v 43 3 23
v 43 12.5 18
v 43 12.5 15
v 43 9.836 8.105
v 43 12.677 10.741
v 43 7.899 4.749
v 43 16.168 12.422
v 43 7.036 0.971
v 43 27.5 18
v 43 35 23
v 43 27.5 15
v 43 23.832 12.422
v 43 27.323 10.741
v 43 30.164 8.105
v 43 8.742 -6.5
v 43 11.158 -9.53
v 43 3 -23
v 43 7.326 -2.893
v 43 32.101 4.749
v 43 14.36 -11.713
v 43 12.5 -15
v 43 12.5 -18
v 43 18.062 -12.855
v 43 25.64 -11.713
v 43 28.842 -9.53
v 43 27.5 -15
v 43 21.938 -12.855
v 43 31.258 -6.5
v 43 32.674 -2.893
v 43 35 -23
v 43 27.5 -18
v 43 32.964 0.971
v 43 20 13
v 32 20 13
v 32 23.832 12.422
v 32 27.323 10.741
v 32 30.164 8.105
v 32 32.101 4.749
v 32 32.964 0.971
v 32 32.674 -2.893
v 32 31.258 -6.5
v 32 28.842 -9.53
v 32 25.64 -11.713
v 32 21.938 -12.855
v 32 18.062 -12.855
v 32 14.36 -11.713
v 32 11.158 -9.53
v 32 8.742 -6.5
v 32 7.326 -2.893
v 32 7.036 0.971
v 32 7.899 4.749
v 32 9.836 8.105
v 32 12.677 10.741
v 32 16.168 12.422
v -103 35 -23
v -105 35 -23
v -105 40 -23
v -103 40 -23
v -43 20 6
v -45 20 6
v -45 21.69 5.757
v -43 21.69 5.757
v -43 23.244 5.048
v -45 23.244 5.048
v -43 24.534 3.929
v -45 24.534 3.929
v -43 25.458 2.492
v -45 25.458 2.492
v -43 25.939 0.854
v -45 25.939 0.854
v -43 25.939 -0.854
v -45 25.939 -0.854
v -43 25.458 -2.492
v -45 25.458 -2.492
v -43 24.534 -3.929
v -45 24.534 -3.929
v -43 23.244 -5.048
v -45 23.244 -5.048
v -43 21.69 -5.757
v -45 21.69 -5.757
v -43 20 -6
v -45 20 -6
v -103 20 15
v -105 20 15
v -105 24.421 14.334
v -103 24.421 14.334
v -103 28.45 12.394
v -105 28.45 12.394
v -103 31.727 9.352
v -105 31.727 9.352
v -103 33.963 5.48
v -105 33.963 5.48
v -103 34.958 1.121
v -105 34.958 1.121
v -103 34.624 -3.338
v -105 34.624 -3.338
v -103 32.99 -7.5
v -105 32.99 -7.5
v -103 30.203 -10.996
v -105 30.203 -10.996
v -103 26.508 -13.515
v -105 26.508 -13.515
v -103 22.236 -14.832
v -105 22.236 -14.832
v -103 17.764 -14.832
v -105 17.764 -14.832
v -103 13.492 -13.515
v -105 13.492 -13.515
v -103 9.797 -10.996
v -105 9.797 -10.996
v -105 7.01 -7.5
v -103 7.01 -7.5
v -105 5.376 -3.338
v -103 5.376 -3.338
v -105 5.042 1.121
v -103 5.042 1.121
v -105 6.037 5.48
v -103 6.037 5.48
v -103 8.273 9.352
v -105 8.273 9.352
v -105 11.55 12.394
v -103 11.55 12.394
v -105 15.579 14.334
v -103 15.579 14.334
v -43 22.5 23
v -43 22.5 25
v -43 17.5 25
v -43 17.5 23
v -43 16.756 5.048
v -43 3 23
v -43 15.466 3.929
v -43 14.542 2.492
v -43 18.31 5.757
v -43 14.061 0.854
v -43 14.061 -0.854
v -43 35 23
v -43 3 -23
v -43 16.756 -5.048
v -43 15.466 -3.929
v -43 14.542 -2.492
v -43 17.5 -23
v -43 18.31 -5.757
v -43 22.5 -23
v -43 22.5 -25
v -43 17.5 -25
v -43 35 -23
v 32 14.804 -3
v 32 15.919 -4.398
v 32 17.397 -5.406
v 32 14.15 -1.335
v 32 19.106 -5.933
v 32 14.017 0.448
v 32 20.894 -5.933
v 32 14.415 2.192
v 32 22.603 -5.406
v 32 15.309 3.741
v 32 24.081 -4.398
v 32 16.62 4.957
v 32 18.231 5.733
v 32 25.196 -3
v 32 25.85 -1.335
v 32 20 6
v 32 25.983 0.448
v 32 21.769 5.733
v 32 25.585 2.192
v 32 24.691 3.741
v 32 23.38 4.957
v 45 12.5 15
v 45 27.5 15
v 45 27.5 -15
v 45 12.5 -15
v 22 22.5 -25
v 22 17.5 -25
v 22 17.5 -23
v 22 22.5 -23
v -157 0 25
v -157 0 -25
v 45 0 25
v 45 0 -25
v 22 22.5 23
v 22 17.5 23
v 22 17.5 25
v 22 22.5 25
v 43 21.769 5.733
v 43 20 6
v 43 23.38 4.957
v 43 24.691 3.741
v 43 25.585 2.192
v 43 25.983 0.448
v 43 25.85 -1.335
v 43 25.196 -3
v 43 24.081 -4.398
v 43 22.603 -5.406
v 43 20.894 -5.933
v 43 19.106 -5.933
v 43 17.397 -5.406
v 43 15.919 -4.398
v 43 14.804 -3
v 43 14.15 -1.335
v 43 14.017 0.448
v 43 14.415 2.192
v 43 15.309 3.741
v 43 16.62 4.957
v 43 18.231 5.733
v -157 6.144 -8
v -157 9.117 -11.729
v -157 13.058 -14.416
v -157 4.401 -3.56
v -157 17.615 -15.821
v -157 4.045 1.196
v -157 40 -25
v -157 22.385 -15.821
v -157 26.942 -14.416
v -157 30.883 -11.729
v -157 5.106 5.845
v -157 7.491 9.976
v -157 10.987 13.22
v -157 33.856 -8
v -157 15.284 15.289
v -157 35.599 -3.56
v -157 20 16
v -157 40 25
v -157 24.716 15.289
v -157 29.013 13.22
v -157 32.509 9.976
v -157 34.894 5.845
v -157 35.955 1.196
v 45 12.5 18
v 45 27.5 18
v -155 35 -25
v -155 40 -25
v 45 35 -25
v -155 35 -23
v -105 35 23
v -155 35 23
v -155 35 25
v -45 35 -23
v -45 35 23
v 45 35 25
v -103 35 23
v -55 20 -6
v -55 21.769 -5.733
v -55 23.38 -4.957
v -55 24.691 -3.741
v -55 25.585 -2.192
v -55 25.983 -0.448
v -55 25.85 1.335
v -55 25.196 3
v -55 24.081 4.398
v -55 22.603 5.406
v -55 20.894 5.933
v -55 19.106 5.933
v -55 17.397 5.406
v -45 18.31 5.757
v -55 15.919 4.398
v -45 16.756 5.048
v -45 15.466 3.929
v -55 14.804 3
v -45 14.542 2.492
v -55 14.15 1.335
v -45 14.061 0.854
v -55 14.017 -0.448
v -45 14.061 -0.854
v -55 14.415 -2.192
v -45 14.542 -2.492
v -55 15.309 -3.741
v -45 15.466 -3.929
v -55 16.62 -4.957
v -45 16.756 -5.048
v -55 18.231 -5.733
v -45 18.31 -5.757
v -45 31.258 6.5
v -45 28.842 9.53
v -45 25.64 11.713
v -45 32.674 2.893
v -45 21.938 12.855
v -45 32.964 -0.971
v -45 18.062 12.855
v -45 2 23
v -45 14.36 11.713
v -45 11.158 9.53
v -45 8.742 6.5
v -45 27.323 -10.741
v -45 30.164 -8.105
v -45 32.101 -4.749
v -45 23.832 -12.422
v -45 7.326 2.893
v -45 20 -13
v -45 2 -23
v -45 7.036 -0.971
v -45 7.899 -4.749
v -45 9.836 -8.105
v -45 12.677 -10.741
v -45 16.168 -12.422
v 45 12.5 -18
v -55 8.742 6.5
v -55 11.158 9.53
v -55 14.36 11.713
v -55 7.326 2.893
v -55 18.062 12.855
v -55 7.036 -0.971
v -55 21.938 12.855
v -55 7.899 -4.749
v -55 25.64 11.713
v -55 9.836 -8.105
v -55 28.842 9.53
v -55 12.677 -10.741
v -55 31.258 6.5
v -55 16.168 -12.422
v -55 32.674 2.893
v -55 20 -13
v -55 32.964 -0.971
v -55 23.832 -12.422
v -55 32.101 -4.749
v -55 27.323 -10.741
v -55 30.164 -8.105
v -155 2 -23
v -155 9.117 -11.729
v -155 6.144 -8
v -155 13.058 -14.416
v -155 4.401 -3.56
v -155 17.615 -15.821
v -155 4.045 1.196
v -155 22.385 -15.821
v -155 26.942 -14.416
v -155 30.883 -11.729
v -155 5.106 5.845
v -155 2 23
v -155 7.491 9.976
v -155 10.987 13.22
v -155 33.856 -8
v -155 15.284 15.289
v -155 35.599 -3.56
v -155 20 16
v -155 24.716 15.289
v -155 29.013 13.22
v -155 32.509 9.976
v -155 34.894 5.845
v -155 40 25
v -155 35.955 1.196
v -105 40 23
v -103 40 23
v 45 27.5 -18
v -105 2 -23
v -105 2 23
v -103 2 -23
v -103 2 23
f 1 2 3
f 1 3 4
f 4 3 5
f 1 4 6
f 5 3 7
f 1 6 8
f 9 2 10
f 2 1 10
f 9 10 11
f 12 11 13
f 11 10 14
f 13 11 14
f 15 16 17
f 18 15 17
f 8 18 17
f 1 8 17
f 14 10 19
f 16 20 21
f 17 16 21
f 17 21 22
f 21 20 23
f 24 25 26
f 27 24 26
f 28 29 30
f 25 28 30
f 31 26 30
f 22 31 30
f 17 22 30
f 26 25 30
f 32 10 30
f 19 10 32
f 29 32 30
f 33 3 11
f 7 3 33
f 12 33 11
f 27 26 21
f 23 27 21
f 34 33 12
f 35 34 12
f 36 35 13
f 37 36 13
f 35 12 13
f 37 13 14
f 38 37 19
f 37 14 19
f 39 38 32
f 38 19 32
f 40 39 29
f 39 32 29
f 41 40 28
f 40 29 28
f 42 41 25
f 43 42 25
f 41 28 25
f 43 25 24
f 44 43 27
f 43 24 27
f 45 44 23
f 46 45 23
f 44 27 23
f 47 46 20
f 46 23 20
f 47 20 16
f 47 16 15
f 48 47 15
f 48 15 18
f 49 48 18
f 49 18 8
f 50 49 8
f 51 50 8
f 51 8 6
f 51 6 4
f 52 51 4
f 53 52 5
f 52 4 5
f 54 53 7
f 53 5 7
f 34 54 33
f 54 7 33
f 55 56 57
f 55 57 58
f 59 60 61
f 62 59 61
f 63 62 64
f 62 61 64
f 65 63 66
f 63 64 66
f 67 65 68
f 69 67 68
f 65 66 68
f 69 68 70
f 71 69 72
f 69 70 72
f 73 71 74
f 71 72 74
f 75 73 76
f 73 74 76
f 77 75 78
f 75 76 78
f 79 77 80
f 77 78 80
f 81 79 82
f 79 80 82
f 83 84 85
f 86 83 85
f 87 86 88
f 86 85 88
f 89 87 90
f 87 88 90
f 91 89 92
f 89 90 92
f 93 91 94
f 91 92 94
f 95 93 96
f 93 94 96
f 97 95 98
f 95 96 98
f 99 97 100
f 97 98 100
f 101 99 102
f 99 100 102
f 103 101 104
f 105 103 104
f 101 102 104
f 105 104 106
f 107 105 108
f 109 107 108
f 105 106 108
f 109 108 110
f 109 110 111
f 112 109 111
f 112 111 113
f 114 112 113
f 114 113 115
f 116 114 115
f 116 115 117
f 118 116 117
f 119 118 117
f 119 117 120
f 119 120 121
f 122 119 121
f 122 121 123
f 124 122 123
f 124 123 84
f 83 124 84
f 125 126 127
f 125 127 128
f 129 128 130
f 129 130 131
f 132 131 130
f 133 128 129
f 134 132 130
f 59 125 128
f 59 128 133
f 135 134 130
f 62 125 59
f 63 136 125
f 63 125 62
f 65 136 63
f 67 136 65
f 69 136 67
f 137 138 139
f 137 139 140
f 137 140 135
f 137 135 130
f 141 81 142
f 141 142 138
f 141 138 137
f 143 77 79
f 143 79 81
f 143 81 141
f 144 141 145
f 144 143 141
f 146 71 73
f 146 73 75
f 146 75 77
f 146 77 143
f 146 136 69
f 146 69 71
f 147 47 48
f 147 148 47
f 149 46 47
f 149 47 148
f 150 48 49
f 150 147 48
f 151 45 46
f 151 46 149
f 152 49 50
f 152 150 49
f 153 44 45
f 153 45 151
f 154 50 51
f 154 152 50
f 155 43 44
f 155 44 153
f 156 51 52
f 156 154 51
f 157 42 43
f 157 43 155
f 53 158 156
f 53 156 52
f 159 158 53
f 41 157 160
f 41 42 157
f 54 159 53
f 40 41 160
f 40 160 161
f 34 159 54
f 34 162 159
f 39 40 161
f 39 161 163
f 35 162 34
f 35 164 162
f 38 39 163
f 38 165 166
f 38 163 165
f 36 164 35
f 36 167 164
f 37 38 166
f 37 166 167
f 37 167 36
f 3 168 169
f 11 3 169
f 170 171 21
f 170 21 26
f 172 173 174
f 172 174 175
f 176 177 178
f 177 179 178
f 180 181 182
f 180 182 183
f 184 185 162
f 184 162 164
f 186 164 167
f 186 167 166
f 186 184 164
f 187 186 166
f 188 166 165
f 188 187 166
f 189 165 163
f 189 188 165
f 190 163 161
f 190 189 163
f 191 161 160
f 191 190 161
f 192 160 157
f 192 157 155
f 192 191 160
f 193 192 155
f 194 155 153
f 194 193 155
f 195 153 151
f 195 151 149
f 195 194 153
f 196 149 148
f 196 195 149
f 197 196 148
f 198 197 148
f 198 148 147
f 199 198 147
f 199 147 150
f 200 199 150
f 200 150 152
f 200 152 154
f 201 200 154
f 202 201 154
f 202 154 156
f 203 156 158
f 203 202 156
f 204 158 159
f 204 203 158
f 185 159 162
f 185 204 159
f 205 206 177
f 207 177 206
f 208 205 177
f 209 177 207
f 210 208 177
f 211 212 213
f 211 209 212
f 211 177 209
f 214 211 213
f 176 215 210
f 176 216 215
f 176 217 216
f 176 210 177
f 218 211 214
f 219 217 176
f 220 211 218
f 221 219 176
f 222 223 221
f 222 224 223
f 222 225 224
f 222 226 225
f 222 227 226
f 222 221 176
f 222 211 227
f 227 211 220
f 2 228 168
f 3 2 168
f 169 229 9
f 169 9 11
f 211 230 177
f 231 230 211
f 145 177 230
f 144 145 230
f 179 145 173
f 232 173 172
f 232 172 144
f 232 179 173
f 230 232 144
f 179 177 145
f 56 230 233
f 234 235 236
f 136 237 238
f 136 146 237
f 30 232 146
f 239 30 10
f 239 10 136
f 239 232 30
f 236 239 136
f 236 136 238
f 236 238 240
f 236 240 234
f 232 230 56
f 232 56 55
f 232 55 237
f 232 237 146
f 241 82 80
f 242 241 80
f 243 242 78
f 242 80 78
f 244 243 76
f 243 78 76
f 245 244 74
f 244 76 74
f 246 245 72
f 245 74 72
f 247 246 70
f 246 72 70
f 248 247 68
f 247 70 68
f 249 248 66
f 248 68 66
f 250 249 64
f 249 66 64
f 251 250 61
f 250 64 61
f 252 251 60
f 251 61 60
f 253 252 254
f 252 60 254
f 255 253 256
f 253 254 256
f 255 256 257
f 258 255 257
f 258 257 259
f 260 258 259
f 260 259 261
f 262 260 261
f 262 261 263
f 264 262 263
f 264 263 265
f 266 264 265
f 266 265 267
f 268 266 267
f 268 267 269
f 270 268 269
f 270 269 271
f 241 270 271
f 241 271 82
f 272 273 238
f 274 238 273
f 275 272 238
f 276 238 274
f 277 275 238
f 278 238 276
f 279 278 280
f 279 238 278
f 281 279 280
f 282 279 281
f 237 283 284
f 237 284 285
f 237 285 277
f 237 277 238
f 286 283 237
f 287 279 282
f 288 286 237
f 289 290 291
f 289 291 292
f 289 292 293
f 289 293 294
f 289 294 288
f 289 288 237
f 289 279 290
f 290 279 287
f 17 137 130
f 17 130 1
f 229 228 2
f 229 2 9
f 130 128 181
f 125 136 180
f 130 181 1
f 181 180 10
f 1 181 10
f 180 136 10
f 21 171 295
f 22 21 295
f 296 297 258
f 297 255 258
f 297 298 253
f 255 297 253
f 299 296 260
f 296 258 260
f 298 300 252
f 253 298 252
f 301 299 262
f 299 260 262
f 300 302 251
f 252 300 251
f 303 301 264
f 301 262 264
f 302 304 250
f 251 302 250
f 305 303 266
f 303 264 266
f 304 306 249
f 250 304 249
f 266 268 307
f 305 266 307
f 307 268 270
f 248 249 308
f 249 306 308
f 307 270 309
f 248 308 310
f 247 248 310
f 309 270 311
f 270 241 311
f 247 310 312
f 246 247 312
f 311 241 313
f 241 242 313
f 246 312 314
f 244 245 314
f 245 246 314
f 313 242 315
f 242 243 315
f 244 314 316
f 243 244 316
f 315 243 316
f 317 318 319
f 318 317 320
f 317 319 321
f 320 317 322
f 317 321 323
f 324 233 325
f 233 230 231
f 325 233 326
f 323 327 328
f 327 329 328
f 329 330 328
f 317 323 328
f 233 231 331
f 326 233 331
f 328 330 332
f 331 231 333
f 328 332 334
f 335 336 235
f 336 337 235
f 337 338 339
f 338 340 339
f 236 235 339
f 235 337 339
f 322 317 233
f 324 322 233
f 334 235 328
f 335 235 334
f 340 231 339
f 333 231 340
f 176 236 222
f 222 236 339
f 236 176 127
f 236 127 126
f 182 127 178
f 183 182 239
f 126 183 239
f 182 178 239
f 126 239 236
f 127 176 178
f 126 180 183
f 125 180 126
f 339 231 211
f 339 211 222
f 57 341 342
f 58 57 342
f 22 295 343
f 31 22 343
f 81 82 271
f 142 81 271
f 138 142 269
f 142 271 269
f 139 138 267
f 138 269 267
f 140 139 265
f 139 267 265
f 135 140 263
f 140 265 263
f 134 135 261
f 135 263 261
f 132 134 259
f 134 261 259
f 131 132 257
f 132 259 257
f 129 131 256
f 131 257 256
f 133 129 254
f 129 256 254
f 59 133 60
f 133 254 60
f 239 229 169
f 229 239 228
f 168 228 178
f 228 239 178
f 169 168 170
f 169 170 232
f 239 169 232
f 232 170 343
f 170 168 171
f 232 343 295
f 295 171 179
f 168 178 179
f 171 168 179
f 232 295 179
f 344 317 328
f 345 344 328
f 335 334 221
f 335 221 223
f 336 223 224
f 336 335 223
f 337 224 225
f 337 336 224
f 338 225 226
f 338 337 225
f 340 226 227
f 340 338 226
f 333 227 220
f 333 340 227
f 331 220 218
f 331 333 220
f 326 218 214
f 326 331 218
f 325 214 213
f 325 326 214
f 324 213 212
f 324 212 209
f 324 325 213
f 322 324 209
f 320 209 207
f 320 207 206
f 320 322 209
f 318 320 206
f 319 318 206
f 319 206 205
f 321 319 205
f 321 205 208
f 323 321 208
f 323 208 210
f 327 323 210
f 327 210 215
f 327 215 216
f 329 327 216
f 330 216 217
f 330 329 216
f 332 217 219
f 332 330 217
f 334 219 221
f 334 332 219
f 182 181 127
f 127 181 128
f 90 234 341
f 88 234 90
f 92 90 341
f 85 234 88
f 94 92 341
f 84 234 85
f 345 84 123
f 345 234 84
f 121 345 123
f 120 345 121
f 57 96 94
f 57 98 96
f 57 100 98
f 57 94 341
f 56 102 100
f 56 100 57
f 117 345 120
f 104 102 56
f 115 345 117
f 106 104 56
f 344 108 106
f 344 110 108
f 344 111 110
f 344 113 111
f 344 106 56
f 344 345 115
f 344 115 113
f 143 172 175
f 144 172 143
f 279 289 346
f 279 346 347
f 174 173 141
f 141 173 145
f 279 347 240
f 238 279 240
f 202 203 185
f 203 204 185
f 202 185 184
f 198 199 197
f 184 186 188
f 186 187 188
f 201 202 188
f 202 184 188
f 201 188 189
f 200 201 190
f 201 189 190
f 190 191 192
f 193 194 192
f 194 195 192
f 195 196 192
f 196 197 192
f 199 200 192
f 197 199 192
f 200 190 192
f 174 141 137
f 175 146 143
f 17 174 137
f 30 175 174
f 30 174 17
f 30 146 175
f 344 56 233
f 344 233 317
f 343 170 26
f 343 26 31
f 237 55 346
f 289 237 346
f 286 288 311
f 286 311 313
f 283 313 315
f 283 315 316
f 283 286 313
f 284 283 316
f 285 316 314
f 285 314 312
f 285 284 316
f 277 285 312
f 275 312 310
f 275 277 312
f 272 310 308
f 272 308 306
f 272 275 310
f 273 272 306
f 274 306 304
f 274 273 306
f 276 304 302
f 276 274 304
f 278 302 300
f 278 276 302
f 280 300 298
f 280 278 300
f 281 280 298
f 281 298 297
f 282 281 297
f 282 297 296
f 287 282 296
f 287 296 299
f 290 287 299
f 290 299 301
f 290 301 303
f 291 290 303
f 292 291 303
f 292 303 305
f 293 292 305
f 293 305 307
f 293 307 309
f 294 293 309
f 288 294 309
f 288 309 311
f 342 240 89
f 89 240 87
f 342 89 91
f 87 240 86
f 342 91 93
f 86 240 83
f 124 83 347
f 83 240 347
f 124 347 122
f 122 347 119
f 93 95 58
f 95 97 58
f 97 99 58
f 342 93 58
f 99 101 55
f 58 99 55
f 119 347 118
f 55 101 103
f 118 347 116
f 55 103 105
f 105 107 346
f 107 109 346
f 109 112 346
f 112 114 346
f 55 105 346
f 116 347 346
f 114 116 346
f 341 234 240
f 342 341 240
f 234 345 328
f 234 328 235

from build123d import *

# Parameters (mm, degrees)
SKETCH_1_W          = 90
SKETCH_1_H          = 50
EXTRUDE_1_DEPTH     = 35
SKETCH_2_W          = 86
SKETCH_2_H          = 46
CUT_EXTRUDE_1_DEPTH = 32
SKETCH_3_R          = 6
CUT_EXTRUDE_2_DEPTH = 2
SKETCH_4_R          = 13
SKETCH_4_R_2        = 6
EXTRUDE_2_DEPTH     = 11
SKETCH_5_R          = 13
SKETCH_5_R_2        = 6
EXTRUDE_4_DEPTH     = 12
SKETCH_6_W          = 65
SKETCH_6_H          = 5
CUT_EXTRUDE_3_DEPTH = 51
SKETCH_7_W          = 3
SKETCH_7_H          = 15
CUT_EXTRUDE_4_DEPTH = 30
EXTRUDE_5_DEPTH     = 110
SKETCH_9_W          = 50
SKETCH_9_H          = 40
SKETCH_9_R          = 16
EXTRUDE_6_DEPTH     = 2
SKETCH_10_W         = 2
SKETCH_10_H         = 46
EXTRUDE_7_DEPTH     = 38
SKETCH_11_R         = 15
CUT_EXTRUDE_5_DEPTH = 10


with BuildPart() as part:
    # 草圖1 → 填料-伸長1 (new body)
    with BuildSketch(Plane(origin=(0, 0, 0), x_dir=(1, 0, 0), z_dir=(0, 1, 0))):
        Rectangle(SKETCH_1_W, SKETCH_1_H)
    extrude(amount=EXTRUDE_1_DEPTH)

    # 草圖2 → 除料-伸長1 (cut)
    with BuildSketch(Plane(origin=(0, 35, 0), x_dir=(1, 0, 0), z_dir=(0, 1, 0))):
        Rectangle(SKETCH_2_W, SKETCH_2_H)
    extrude(amount=-CUT_EXTRUDE_1_DEPTH, mode=Mode.SUBTRACT)

    # 草圖3 → 除料-伸長2 (cut)
    with BuildSketch(Plane.ZY.offset(45)):
        with Locations((0, 20)):
            Circle(SKETCH_3_R)
    extrude(amount=-CUT_EXTRUDE_2_DEPTH, mode=Mode.SUBTRACT)

    # 草圖4 → 填料-伸長2 (add)
    with BuildSketch(Plane.ZY.offset(-43)):
        with Locations((0, 20)):
            Circle(SKETCH_4_R)
        with Locations((0, 20)):
            Circle(SKETCH_4_R_2, mode=Mode.SUBTRACT)
    extrude(amount=EXTRUDE_2_DEPTH)

    # 草圖5 → 填料-伸長4 (add)
    with BuildSketch(Plane(origin=(-43, 0, 0), x_dir=(0, 0, -1), z_dir=(1, 0, 0))):
        with Locations((0, 20)):
            Circle(SKETCH_5_R)
        with Locations((0, 20)):
            Circle(SKETCH_5_R_2, mode=Mode.SUBTRACT)
    extrude(amount=-EXTRUDE_4_DEPTH)

    # 草圖6 → 除料-伸長3 (cut, through all)
    with BuildSketch(Plane(origin=(0, 0, -25), x_dir=(-1, 0, 0), z_dir=(0, 0, -1))):
        with Locations((10.5, 20)):
            Rectangle(SKETCH_6_W, SKETCH_6_H)
    extrude(amount=-CUT_EXTRUDE_3_DEPTH, mode=Mode.SUBTRACT)

    # 草圖7 → 除料-伸長4 (cut)
    with BuildSketch(Plane(origin=(45, 0, 0), x_dir=(0, 0, -1), z_dir=(1, 0, 0))):
        with Locations((-16.5, 20)):
            Rectangle(SKETCH_7_W, SKETCH_7_H)
        with Locations((16.5, 20)):
            Rectangle(SKETCH_7_W, SKETCH_7_H)
    extrude(amount=-CUT_EXTRUDE_4_DEPTH, mode=Mode.SUBTRACT)

    # 草圖8 → 填料-伸長5 (add)
    with BuildSketch(Plane.ZY.offset(45)):
        Polygon((-25, 35), (-23, 35), (-23, 2), (23, 2), (23, 35), (25, 35), (25, 0), (23, 0), (-23, 0), (-25, 0), align=None)
    extrude(amount=EXTRUDE_5_DEPTH)

    # 草圖9 → 填料-伸長6 (add)
    with BuildSketch(Plane.ZY.offset(155)):
        with Locations((0, 20)):
            Rectangle(SKETCH_9_W, SKETCH_9_H)
        with Locations((0, 20)):
            Circle(SKETCH_9_R, mode=Mode.SUBTRACT)
    extrude(amount=EXTRUDE_6_DEPTH)

    # 草圖10 → 填料-伸長7 (add)
    with BuildSketch(Plane(origin=(0, 2, 0), x_dir=(1, 0, 0), z_dir=(0, 1, 0))):
        with Locations((-104, 0)):
            Rectangle(SKETCH_10_W, SKETCH_10_H)
    extrude(amount=EXTRUDE_7_DEPTH)

    # 草圖11 → 除料-伸長5 (cut)
    with BuildSketch(Plane.ZY.offset(105)):
        with Locations((0, 20)):
            Circle(SKETCH_11_R)
    extrude(amount=-CUT_EXTRUDE_5_DEPTH, mode=Mode.SUBTRACT)


solid = part.part
